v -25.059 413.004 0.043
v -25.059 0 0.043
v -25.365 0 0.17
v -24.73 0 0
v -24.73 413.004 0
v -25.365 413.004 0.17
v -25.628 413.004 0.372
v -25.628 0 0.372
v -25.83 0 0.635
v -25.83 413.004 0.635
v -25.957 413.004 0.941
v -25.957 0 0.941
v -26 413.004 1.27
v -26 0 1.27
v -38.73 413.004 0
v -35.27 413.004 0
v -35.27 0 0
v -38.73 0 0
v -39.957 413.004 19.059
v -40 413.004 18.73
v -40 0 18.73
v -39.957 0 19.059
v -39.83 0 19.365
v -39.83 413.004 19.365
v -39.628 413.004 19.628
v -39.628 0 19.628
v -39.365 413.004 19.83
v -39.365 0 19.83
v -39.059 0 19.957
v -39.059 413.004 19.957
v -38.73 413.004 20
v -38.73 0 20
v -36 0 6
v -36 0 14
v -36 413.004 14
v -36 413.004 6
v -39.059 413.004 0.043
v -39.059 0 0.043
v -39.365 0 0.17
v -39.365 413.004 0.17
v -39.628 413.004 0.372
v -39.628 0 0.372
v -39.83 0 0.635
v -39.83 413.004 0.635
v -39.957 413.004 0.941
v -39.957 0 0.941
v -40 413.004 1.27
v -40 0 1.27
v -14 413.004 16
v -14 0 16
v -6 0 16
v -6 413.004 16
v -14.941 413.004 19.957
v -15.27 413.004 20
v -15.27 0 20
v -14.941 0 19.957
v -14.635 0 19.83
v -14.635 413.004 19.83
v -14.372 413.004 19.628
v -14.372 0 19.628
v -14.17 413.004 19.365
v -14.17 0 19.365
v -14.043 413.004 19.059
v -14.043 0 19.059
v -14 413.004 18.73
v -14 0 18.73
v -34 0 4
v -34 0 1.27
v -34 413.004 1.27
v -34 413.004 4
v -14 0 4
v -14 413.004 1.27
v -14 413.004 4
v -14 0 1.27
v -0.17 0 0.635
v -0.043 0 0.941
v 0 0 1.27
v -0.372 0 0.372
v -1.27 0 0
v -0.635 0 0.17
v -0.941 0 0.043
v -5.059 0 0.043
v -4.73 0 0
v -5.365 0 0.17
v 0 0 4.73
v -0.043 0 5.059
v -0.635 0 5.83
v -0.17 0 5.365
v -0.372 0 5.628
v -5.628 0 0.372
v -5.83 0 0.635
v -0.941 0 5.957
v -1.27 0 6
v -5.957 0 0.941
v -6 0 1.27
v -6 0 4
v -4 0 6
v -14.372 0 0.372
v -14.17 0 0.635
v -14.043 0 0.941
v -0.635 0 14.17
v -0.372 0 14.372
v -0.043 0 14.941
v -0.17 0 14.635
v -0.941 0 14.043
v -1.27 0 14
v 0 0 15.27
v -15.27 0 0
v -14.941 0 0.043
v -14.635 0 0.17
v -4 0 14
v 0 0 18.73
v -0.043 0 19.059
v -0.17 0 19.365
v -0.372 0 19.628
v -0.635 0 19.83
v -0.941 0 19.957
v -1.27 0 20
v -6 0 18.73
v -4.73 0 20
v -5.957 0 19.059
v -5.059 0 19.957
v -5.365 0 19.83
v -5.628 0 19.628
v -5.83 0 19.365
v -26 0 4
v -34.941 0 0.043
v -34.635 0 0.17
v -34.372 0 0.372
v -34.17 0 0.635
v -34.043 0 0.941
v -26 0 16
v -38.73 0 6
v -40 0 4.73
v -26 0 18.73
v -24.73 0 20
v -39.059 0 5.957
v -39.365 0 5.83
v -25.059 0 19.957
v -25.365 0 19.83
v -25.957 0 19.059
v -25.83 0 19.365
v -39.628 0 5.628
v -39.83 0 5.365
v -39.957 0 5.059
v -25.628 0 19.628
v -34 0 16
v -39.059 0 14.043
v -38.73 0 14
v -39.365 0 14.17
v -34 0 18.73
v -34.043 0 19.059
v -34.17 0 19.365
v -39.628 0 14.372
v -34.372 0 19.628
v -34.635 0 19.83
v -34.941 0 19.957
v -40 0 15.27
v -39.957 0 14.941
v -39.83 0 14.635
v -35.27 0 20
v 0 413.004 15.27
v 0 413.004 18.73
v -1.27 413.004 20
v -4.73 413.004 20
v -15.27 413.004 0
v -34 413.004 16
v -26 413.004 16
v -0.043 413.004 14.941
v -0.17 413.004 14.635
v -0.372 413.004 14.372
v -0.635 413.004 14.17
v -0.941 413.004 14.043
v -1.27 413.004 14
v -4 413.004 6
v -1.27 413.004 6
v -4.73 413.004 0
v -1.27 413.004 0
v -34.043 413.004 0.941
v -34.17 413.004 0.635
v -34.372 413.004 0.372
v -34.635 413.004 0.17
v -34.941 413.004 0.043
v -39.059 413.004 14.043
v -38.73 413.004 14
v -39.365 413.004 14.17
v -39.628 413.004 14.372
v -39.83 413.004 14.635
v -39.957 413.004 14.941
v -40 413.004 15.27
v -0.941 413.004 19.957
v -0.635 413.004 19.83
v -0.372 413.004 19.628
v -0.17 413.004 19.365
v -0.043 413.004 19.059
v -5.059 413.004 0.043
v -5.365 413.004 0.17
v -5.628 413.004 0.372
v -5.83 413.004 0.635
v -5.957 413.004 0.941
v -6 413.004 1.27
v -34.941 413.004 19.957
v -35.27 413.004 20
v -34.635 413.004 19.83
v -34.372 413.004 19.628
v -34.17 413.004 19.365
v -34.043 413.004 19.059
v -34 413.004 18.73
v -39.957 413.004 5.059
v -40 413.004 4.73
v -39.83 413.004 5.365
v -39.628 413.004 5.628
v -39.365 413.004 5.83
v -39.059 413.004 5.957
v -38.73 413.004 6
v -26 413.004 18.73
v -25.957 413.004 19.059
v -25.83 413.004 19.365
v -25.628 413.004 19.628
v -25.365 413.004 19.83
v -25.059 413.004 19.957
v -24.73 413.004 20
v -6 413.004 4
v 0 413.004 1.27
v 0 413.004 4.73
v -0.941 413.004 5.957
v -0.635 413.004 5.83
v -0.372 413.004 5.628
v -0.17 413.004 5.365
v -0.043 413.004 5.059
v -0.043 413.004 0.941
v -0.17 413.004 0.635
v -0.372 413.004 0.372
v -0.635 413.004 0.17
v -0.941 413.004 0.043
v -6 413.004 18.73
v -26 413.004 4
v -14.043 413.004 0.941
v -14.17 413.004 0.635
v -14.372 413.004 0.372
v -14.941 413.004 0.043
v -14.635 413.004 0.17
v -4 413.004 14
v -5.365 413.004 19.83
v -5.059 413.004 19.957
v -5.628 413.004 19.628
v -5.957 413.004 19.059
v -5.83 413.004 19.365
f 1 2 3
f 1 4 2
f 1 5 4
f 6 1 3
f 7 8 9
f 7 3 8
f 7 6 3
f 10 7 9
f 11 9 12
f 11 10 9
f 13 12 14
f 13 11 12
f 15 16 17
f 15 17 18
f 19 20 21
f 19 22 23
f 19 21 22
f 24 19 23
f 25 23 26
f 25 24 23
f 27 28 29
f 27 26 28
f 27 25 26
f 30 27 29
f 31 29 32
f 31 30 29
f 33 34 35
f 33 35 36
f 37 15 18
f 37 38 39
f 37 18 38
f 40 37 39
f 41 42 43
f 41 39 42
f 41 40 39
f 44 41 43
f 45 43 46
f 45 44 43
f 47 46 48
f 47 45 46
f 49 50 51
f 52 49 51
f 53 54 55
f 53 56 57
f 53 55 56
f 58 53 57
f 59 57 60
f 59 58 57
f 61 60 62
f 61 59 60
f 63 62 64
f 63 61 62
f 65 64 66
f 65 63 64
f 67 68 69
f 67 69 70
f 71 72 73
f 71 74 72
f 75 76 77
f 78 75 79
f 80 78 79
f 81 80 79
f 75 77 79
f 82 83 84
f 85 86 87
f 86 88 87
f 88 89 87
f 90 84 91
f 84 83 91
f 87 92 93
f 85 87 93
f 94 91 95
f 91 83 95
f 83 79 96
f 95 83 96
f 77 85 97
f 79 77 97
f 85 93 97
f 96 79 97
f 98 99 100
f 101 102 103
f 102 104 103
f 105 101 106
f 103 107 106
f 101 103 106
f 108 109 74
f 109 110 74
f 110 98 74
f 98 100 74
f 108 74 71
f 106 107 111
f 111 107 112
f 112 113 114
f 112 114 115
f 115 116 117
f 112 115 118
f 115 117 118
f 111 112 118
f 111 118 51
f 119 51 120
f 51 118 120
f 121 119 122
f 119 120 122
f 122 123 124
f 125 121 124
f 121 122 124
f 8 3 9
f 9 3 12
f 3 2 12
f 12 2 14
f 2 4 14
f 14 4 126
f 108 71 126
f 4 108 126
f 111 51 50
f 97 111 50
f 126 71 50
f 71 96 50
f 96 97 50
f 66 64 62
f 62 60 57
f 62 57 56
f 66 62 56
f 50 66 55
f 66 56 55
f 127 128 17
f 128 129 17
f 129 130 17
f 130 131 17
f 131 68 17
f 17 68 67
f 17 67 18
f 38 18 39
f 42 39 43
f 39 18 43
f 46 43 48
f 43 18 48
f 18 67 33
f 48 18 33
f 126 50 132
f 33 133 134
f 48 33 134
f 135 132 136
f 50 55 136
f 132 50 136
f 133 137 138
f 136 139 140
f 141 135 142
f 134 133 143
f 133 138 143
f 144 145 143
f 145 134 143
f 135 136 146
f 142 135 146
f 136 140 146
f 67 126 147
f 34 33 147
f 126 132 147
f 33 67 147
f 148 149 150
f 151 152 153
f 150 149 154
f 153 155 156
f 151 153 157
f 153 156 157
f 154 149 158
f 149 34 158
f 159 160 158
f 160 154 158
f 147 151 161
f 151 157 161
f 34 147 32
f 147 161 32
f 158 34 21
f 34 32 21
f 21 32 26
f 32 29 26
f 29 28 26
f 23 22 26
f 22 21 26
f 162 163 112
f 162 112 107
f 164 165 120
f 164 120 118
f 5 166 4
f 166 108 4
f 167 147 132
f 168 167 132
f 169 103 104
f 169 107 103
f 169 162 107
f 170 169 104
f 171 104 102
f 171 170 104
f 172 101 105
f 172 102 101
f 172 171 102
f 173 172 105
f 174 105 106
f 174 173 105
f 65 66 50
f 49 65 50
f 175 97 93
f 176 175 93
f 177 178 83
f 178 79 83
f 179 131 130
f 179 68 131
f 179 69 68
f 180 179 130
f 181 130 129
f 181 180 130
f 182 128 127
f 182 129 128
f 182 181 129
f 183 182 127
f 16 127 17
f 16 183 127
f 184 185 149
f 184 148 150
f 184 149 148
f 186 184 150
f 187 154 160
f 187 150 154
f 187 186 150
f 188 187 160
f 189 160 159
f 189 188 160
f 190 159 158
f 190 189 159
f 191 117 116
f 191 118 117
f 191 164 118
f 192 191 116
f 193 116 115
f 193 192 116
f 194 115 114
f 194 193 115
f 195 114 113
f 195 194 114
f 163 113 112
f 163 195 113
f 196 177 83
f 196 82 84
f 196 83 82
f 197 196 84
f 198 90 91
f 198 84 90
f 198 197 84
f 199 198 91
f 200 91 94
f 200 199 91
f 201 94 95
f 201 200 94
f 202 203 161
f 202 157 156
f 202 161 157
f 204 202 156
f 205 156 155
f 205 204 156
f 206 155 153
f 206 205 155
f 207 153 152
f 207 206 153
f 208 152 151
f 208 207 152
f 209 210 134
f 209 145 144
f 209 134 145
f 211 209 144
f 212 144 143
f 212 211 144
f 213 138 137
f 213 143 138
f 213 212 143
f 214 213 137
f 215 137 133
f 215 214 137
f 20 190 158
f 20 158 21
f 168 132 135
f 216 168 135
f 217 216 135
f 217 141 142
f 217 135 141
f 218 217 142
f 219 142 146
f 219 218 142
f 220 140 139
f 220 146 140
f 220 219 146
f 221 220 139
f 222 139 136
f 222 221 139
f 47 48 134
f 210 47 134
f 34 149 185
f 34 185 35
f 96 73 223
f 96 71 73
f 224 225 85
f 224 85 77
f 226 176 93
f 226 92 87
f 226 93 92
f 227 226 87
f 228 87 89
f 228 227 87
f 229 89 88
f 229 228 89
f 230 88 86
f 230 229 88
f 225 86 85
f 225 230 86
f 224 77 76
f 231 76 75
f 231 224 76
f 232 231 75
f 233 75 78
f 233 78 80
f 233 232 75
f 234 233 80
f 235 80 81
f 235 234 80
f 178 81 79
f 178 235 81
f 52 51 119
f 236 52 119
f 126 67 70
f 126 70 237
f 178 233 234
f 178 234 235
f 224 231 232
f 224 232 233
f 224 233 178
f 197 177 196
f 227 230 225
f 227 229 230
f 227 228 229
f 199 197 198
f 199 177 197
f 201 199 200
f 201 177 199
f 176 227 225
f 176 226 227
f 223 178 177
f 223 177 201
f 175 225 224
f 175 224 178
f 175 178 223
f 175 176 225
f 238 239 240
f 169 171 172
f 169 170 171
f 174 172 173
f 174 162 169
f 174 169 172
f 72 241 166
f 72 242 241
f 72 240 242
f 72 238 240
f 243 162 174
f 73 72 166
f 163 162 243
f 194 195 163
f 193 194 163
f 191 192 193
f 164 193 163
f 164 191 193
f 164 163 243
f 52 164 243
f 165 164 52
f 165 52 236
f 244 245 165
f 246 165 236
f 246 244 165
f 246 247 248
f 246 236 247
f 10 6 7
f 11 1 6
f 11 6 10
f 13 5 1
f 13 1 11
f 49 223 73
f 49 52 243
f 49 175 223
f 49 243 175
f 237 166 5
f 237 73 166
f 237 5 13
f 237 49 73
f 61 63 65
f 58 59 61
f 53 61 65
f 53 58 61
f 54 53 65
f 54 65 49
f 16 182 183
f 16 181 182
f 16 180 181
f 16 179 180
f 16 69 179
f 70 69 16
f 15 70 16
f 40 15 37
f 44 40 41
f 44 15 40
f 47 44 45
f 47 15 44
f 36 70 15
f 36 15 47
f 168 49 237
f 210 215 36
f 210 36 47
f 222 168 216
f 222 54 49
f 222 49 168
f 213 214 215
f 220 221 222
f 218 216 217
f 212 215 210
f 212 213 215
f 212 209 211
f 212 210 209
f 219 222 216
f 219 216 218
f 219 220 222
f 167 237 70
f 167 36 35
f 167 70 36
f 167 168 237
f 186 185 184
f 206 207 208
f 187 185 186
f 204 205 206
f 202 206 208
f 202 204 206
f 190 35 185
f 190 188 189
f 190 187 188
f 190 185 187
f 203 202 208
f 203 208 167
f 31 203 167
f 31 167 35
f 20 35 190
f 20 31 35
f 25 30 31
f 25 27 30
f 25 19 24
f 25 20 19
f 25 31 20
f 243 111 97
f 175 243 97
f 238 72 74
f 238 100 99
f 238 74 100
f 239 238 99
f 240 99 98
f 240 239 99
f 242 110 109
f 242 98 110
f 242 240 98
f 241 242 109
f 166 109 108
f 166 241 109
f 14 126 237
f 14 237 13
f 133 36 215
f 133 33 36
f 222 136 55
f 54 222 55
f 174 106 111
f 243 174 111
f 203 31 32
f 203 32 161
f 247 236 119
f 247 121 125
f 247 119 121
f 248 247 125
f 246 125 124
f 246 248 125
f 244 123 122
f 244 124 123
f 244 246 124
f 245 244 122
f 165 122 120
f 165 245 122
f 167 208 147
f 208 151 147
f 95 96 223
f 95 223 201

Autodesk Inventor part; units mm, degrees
ref_plane "YZ Plane" through (0, 0, 0) normal (1, 0, 0) x (0, 1, 0)
ref_plane "XZ Plane" through (0, 0, 0) normal (0, 1, 0) x (-1, 0, 0)
sketch "Sketch1" plane through (0, 0, 0) normal (0, 1, 0) x (-1, 0, 0)
  line L0 (0, 0) -> (40, 0)
  line L1 (40, 0) -> (40, 20)
  line L2 (40, 20) -> (0, 20)
  line L3 (0, 20) -> (0, 0)
  line L4 (0, 14) -> (4, 14)
  line L5 (4, 14) -> (4, 6)
  line L6 (4, 6) -> (0, 6)
  line L7 (0, 6) -> (0, 14)
  line L8 (40, 14) -> (36, 14)
  line L9 (36, 14) -> (36, 6)
  line L10 (36, 6) -> (40, 6)
  line L11 (40, 6) -> (40, 14)
  line L12 (6, 0) -> (14, 0)
  line L13 (14, 0) -> (14, 4)
  line L14 (14, 4) -> (6, 4)
  line L15 (6, 4) -> (6, 0)
  line L16 (26, 0) -> (34, 0)
  line L17 (34, 0) -> (34, 4)
  line L18 (34, 4) -> (26, 4)
  line L19 (26, 4) -> (26, 0)
  line L20 (6, 20) -> (14, 20)
  line L21 (14, 20) -> (14, 16)
  line L22 (14, 16) -> (6, 16)
  line L23 (6, 16) -> (6, 20)
  line L24 (26, 20) -> (34, 20)
  line L25 (34, 20) -> (34, 16)
  line L26 (34, 16) -> (26, 16)
  line L27 (26, 16) -> (26, 20)
  dimension "d0" = 40
  dimension "d1" = 20
  dimension "d2" = 6
  dimension "d3" = 8
  dimension "d4" = 4
  dimension "d5" = 8
  dimension "d6" = 6
  dimension "d7" = 4
  dimension "d8" = 4
  dimension "d9" = 8
  dimension "d10" = 6
  dimension "d11" = 4
extrude "Extrusion1" add sketch "Sketch1" along normal blind 413.004 contours L3 L6 L5 L4 L2 L23 L22 L21 L27 L26 L25 L1 L8 L9 L10 L0 L17 L18 L19 L13 L14 L15
fillet "Fillet1" radius 1.27 16 edges at (-40, 206.502, 20) (-40, 206.502, 14) (-40, 206.502, 6) (-40, 206.502, 0) (-34, 206.502, 0) (-34, 206.502, 20) (-26, 206.502, 20) (-14, 206.502, 20) (-6, 206.502, 20) (0, 206.502, 20) (0, 206.502, 14) (0, 206.502, 6) (0, 206.502, 0) (-6, 206.502, 0) (-14, 206.502, 0) (-26, 206.502, 0)
ref_plane "Work Plane1" through (-24.73, 0, 10) normal (0, 0, 1) x (1, 0, 0)
properties part number "20X40long" material "Aluminum 6061"
